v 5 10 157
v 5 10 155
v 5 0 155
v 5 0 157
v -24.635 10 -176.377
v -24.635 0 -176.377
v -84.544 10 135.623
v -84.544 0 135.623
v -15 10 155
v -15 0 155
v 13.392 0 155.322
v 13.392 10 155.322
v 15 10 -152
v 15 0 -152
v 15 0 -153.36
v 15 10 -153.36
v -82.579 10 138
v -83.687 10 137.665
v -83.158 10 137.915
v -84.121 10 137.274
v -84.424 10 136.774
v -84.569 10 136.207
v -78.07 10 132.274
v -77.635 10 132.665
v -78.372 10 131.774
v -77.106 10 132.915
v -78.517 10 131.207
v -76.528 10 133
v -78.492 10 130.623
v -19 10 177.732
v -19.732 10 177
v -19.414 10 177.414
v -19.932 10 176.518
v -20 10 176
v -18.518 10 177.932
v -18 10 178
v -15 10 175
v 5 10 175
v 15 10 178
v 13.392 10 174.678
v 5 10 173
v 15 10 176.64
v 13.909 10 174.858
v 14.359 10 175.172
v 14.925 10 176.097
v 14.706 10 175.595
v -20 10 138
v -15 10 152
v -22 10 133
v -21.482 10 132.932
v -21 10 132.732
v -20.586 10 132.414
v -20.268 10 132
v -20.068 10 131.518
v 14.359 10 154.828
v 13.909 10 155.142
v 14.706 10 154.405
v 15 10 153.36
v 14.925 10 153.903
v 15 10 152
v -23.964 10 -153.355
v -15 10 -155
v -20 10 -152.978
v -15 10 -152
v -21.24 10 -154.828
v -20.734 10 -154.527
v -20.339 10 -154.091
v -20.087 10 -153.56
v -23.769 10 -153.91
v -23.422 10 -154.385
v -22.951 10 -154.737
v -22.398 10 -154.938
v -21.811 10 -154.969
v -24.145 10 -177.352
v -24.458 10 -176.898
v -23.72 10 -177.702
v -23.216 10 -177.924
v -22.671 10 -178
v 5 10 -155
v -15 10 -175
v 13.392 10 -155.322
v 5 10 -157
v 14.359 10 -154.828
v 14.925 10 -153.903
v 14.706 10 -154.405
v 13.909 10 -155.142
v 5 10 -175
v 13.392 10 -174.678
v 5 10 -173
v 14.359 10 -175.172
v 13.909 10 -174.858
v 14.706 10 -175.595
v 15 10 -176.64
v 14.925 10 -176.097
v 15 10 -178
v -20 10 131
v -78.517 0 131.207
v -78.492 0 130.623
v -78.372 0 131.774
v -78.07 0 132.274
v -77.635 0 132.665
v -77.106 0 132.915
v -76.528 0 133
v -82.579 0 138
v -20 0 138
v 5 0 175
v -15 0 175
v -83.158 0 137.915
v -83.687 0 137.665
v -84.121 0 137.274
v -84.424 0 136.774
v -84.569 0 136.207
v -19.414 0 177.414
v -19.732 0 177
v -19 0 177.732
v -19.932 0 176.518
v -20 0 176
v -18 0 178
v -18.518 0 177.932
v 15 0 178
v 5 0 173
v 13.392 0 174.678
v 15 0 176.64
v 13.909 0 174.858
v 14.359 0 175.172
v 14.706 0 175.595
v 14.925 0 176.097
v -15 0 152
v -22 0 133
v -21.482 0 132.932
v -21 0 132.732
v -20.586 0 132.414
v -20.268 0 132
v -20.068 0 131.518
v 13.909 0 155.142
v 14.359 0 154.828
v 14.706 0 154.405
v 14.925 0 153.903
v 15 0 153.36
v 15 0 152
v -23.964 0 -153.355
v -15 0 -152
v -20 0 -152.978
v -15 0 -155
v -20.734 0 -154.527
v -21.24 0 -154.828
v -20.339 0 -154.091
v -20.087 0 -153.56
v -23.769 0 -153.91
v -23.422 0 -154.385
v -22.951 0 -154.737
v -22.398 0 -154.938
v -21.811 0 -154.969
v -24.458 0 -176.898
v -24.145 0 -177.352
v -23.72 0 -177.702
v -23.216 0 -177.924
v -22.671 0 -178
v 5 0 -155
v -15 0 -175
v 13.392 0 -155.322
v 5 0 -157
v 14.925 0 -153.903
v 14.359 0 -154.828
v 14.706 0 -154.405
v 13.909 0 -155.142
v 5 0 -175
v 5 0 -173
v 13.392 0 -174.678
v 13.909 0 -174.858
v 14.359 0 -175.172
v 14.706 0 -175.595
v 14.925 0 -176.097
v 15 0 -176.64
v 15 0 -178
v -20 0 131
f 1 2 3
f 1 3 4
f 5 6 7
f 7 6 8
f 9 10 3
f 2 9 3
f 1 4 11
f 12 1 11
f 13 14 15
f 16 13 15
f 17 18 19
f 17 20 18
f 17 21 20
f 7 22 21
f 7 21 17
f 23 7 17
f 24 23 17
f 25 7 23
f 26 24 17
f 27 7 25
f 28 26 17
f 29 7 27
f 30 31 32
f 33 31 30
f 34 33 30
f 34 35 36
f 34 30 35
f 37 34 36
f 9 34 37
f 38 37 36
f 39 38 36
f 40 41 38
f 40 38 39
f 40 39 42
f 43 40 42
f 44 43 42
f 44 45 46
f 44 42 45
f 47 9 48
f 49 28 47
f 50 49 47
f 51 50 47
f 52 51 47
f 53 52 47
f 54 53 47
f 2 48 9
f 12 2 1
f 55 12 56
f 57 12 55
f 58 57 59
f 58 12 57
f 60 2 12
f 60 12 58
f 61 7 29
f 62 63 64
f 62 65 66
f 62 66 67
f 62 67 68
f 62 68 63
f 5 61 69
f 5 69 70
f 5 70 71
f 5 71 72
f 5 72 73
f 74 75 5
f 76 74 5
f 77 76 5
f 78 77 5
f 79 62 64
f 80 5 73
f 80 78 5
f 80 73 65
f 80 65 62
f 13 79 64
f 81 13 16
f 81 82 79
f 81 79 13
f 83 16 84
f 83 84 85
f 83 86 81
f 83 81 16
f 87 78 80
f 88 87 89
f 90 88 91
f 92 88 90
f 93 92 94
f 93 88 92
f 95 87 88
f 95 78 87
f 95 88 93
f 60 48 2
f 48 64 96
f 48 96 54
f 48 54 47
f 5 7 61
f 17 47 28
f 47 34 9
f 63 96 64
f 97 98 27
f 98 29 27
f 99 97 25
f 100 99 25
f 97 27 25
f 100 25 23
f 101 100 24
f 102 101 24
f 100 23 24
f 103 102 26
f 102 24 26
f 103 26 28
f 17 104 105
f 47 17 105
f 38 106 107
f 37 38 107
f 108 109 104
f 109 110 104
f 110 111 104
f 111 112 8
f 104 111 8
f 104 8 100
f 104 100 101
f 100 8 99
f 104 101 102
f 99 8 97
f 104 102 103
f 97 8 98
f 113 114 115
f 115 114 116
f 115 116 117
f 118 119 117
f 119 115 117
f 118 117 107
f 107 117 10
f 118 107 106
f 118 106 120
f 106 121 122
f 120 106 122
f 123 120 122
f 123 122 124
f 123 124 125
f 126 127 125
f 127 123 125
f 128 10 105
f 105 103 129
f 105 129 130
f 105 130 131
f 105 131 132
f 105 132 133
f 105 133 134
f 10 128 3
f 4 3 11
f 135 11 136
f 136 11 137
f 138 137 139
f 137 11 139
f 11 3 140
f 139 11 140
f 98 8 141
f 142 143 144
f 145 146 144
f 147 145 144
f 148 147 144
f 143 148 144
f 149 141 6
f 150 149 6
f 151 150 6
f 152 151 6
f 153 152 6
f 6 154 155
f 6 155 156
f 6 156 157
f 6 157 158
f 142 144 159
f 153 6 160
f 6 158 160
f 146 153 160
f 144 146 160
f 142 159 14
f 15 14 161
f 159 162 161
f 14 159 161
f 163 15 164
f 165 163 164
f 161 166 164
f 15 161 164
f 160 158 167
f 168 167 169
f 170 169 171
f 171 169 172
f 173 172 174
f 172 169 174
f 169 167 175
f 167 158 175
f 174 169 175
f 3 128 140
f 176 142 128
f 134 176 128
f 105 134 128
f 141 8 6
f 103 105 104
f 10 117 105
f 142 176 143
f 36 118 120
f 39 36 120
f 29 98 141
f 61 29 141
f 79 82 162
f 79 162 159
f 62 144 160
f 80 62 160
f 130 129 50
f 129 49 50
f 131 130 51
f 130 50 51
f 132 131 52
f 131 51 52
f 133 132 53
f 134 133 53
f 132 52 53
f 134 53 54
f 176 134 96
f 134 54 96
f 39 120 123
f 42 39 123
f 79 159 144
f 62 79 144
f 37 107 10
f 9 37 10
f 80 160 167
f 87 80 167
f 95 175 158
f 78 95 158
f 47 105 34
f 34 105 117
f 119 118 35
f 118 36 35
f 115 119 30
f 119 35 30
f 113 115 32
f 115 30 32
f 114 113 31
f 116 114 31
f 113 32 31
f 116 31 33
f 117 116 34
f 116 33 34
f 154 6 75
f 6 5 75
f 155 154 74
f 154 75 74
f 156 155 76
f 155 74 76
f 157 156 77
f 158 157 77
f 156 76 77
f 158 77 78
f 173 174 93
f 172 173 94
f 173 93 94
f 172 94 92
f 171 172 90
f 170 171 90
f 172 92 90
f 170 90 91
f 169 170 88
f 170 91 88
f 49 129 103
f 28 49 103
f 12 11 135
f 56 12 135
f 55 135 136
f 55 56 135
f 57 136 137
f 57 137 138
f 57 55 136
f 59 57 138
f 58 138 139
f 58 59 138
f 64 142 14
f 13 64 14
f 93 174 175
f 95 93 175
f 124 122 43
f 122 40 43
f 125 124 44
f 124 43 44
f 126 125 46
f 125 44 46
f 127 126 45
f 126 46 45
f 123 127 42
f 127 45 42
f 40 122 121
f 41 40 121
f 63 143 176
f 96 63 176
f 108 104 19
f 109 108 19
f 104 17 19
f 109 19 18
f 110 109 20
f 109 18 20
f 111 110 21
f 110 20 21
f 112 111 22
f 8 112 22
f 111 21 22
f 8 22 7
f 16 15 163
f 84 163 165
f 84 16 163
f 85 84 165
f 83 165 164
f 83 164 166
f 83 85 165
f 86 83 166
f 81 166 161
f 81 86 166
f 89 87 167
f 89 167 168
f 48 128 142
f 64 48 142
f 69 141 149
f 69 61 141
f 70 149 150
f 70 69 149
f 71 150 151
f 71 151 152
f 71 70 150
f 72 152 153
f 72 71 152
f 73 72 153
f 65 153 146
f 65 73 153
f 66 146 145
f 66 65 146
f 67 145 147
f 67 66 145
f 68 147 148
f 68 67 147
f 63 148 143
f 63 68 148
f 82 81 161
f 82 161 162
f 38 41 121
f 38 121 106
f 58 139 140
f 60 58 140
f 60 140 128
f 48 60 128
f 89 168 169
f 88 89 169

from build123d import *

# Parameters (mm, degrees)
EXTRUDE_1_DEPTH = 10
FILLET_1_R      = 2


with BuildPart() as part:
    # 草图1 → 凸台-拉伸1 (new body)
    with BuildSketch(Plane(origin=(0, 0, 0), x_dir=(1, 0, 0), z_dir=(0, 1, 0))):
        Polygon((-15, -175), (-15, -155), (5, -155), (5, -157), (15, -155), (15, -152), (-15, -152), (-15, 152), (15, 152), (15, 155), (5, 157), (5, 155), (-15, 155), (-15, 175), (5, 175), (5, 173), (15, 175), (15, 178), (-24.323280296, 178), (-85, -138), (-20, -138), (-20, -178), (15, -178), (15, -175), (5, -173), (5, -175), align=None)
        Polygon((-20, 174), (-20, -133), (-78.948585282, -133), align=None, mode=Mode.SUBTRACT)
    extrude(amount=EXTRUDE_1_DEPTH)

    # 圆角1
    fillet_1_edges = [part.edges().sort_by_distance(p)[0] for p in [
        (-24.323280296, 5, -178),
        (-85, 5, 138),
        (-20, 5, 178),
        (15, 5, 175),
        (15, 5, -155),
        (15, 5, -175),
        (-20, 5, -174),
        (-20, 5, 133),
        (-78.948585282, 5, 133),
        (15, 5, 155),
    ]]
    fillet(fillet_1_edges, radius=FILLET_1_R)


solid = part.part
